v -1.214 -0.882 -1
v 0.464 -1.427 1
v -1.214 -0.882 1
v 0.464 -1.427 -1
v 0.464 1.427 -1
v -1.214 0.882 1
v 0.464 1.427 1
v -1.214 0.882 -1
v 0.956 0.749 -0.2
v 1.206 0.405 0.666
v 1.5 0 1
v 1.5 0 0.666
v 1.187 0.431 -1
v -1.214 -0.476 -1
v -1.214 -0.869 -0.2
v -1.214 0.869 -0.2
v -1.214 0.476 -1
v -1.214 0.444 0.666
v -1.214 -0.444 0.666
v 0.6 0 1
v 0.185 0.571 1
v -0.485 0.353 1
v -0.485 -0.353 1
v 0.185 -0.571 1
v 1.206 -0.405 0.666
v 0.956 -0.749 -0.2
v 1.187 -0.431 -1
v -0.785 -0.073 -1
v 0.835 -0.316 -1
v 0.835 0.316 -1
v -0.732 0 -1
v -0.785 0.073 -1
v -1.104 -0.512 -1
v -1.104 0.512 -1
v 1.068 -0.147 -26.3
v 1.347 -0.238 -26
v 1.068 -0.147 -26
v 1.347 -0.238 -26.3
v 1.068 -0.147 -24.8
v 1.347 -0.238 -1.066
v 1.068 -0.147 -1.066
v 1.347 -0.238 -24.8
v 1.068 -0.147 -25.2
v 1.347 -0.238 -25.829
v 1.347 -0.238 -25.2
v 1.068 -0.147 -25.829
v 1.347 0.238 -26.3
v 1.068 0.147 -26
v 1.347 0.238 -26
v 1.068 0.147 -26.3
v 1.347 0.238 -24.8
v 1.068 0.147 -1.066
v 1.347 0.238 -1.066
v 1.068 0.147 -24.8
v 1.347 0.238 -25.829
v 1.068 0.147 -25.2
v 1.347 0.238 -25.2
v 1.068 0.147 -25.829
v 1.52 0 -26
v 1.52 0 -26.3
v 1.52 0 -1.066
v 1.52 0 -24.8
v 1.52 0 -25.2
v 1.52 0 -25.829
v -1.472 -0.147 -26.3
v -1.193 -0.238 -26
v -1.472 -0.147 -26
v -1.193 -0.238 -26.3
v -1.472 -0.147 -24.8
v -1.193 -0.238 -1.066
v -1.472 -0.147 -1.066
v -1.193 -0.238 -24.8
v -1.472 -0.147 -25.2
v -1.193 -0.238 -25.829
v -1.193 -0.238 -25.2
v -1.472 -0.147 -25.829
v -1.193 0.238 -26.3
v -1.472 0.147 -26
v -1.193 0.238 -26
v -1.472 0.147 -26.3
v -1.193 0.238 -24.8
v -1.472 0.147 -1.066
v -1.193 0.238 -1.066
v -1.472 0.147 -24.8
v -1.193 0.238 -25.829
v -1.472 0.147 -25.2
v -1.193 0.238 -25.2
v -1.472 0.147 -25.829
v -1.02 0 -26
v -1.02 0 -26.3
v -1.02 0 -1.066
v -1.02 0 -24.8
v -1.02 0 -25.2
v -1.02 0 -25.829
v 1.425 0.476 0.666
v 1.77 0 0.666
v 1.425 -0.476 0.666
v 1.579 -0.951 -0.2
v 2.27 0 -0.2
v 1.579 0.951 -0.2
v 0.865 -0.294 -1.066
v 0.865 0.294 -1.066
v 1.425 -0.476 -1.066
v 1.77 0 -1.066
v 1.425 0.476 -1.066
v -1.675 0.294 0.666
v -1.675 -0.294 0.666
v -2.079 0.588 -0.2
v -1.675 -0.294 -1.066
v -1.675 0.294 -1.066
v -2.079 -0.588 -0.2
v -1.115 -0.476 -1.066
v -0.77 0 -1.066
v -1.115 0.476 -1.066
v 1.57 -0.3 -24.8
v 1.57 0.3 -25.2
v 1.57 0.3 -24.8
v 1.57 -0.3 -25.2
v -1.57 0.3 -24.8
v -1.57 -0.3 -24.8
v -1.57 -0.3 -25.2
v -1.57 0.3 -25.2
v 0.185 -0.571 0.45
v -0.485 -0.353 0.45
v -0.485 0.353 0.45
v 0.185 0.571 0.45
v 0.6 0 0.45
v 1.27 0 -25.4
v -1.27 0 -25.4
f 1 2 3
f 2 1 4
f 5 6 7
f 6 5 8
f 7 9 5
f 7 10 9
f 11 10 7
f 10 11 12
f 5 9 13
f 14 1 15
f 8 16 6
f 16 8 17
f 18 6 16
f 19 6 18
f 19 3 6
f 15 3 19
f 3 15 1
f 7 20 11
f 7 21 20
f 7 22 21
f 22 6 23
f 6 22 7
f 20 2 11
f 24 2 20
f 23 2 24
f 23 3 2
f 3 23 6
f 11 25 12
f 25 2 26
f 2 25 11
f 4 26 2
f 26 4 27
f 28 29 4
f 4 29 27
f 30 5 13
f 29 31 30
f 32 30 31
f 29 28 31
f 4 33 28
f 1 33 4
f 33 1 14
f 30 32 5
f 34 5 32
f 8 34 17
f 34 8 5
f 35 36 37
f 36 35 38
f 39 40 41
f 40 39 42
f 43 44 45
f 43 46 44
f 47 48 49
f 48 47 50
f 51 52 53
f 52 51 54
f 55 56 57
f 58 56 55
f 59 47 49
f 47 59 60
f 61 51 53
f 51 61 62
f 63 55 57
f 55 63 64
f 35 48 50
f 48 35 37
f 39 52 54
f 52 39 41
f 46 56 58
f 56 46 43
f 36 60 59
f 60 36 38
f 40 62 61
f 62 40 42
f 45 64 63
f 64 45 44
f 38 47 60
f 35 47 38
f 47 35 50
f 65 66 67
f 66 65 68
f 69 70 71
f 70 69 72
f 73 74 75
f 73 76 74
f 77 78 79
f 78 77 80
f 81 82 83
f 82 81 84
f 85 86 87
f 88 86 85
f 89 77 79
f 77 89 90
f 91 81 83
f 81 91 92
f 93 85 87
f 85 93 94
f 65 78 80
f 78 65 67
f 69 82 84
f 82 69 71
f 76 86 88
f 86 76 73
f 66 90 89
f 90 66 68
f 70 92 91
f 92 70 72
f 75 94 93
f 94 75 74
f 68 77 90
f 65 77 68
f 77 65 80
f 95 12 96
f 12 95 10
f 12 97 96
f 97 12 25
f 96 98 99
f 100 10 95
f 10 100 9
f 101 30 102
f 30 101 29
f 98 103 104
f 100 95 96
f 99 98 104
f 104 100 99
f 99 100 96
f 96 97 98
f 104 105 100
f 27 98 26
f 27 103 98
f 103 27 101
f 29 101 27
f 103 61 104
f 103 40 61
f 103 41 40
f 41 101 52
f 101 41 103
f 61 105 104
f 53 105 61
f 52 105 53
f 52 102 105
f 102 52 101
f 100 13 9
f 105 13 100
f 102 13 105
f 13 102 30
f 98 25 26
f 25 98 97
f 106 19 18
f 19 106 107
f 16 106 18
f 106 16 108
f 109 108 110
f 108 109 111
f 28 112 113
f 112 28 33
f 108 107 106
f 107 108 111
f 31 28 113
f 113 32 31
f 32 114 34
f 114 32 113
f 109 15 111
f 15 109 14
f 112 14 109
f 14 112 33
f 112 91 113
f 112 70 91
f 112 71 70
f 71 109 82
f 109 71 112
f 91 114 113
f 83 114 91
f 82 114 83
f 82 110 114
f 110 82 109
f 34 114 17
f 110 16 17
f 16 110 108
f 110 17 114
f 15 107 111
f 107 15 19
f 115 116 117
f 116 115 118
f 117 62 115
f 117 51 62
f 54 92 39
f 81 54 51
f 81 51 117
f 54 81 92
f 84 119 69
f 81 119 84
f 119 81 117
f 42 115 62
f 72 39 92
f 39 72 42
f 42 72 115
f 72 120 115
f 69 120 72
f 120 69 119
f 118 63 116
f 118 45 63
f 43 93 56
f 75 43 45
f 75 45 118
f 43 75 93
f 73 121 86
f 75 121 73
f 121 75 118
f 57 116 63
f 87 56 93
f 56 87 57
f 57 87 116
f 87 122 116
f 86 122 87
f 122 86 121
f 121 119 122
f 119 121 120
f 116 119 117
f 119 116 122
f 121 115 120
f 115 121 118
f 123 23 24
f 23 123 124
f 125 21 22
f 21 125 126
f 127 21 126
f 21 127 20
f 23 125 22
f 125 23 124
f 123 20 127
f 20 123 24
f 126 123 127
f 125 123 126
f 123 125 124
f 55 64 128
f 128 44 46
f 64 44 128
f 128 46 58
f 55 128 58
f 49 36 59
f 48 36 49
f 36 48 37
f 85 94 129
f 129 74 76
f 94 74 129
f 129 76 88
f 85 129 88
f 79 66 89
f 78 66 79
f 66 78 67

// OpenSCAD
// Parameters
body_d = 3.0; //[1.5:6.0:0.1]
body_t = 2.0; //[1.0:4.0:0.1]
lead_d = 0.5; //[0.25:1.0:0.05]
lead_len = 25.0; //[12.0:50.0:1]
lead_pitch = 2.54; //[1.27:5.08:0.01]
lead_straight_from_body = 6.0; //[3.0:12.0:0.5]
lead_bend_r = 1.0; //[0.5:3.0:0.1]
overlap = 0.8; //[0.3:2.0:0.1]
meniscus_r = 0.6; //[0.2:1.5:0.1]
marking_d = 1.2; //[0.6:2.4:0.1]
marking_depth = 0.15; //[0.05:0.4:0.05]
tip_chamfer_h = 0.6; //[0.2:1.5:0.1]
tip_chamfer_r = 0.35; //[0.15:0.8:0.05]
ref_bar_t = 0.4; //[0.2:1.0:0.1]
ref_bar_w = 0.6; //[0.3:1.5:0.1]

// Base Shapes
module thermistor_body() {
  color([0.85, 0.85, 0.8]) // Off-white for epoxy
  translate([0, 0, 0])
    cylinder(r=body_d/2, h=body_t, center=true);
}

module lead_1() {
  color([0.2, 0.2, 0.2]) // Dark for leads
  translate([lead_pitch/2, 0, -(lead_len + overlap)/2])
    cylinder(r=lead_d/2, h=lead_len + body_t/2 + overlap, center=true);
}

module lead_2() {
  color([0.2, 0.2, 0.2]) // Dark for leads
  translate([-lead_pitch/2, 0, -(lead_len + overlap)/2])
    cylinder(r=lead_d/2, h=lead_len + body_t/2 + overlap, center=true);
}

module lead_bend_relief_1() {
  translate([lead_pitch/2, 0, -body_t/2 + overlap])
    sphere(r=lead_bend_r, center=true);
}

module lead_bend_relief_2() {
  translate([-lead_pitch/2, 0, -body_t/2 + overlap])
    sphere(r=lead_bend_r, center=true);
}

module epoxy_meniscus_detail_1() {
  translate([lead_pitch/2, 0, -body_t/2 + overlap])
    sphere(r=meniscus_r, center=true);
}

module epoxy_meniscus_detail_2() {
  translate([-lead_pitch/2, 0, -body_t/2 + overlap])
    sphere(r=meniscus_r, center=true);
}

module lead_spacing_reference() {
  color([0.75, 0.75, 0.77]) // Silver for reference bar
  translate([0, 0, -(lead_len + body_t/2) + ref_bar_t/2 + overlap])
    cube([lead_pitch + ref_bar_w, ref_bar_w, ref_bar_t], center=true);
}

module body_marking_cutter() {
  translate([0, 0, body_t/2 - marking_depth/2])
    cylinder(r=marking_d/2, h=marking_depth + overlap, center=true);
}

module lead_tip_chamfer_cutter_1() {
  translate([lead_pitch/2, 0, -(lead_len + body_t/2) + tip_chamfer_h/2])
    cylinder(r1=tip_chamfer_r, r2=0, h=tip_chamfer_h, center=true);
}

module lead_tip_chamfer_cutter_2() {
  translate([-lead_pitch/2, 0, -(lead_len + body_t/2) + tip_chamfer_h/2])
    cylinder(r1=tip_chamfer_r, r2=0, h=tip_chamfer_h, center=true);
}

// Operations
module union_body_with_meniscus() {
  union() {
    thermistor_body();
    epoxy_meniscus_detail_1();
    epoxy_meniscus_detail_2();
  }
}

module union_leads_with_relief() {
  union() {
    lead_1();
    lead_2();
    lead_bend_relief_1();
    lead_bend_relief_2();
  }
}

module union_all_visible() {
  union() {
    union_body_with_meniscus();
    union_leads_with_relief();
    lead_spacing_reference();
  }
}

module difference_body_marking() {
  difference() {
    union_all_visible();
    body_marking_cutter();
  }
}

module difference_lead_tip_chamfer() {
  difference() {
    difference_body_marking();
    lead_tip_chamfer_cutter_1();
    lead_tip_chamfer_cutter_2();
  }
}

// Final Output
difference_lead_tip_chamfer();
